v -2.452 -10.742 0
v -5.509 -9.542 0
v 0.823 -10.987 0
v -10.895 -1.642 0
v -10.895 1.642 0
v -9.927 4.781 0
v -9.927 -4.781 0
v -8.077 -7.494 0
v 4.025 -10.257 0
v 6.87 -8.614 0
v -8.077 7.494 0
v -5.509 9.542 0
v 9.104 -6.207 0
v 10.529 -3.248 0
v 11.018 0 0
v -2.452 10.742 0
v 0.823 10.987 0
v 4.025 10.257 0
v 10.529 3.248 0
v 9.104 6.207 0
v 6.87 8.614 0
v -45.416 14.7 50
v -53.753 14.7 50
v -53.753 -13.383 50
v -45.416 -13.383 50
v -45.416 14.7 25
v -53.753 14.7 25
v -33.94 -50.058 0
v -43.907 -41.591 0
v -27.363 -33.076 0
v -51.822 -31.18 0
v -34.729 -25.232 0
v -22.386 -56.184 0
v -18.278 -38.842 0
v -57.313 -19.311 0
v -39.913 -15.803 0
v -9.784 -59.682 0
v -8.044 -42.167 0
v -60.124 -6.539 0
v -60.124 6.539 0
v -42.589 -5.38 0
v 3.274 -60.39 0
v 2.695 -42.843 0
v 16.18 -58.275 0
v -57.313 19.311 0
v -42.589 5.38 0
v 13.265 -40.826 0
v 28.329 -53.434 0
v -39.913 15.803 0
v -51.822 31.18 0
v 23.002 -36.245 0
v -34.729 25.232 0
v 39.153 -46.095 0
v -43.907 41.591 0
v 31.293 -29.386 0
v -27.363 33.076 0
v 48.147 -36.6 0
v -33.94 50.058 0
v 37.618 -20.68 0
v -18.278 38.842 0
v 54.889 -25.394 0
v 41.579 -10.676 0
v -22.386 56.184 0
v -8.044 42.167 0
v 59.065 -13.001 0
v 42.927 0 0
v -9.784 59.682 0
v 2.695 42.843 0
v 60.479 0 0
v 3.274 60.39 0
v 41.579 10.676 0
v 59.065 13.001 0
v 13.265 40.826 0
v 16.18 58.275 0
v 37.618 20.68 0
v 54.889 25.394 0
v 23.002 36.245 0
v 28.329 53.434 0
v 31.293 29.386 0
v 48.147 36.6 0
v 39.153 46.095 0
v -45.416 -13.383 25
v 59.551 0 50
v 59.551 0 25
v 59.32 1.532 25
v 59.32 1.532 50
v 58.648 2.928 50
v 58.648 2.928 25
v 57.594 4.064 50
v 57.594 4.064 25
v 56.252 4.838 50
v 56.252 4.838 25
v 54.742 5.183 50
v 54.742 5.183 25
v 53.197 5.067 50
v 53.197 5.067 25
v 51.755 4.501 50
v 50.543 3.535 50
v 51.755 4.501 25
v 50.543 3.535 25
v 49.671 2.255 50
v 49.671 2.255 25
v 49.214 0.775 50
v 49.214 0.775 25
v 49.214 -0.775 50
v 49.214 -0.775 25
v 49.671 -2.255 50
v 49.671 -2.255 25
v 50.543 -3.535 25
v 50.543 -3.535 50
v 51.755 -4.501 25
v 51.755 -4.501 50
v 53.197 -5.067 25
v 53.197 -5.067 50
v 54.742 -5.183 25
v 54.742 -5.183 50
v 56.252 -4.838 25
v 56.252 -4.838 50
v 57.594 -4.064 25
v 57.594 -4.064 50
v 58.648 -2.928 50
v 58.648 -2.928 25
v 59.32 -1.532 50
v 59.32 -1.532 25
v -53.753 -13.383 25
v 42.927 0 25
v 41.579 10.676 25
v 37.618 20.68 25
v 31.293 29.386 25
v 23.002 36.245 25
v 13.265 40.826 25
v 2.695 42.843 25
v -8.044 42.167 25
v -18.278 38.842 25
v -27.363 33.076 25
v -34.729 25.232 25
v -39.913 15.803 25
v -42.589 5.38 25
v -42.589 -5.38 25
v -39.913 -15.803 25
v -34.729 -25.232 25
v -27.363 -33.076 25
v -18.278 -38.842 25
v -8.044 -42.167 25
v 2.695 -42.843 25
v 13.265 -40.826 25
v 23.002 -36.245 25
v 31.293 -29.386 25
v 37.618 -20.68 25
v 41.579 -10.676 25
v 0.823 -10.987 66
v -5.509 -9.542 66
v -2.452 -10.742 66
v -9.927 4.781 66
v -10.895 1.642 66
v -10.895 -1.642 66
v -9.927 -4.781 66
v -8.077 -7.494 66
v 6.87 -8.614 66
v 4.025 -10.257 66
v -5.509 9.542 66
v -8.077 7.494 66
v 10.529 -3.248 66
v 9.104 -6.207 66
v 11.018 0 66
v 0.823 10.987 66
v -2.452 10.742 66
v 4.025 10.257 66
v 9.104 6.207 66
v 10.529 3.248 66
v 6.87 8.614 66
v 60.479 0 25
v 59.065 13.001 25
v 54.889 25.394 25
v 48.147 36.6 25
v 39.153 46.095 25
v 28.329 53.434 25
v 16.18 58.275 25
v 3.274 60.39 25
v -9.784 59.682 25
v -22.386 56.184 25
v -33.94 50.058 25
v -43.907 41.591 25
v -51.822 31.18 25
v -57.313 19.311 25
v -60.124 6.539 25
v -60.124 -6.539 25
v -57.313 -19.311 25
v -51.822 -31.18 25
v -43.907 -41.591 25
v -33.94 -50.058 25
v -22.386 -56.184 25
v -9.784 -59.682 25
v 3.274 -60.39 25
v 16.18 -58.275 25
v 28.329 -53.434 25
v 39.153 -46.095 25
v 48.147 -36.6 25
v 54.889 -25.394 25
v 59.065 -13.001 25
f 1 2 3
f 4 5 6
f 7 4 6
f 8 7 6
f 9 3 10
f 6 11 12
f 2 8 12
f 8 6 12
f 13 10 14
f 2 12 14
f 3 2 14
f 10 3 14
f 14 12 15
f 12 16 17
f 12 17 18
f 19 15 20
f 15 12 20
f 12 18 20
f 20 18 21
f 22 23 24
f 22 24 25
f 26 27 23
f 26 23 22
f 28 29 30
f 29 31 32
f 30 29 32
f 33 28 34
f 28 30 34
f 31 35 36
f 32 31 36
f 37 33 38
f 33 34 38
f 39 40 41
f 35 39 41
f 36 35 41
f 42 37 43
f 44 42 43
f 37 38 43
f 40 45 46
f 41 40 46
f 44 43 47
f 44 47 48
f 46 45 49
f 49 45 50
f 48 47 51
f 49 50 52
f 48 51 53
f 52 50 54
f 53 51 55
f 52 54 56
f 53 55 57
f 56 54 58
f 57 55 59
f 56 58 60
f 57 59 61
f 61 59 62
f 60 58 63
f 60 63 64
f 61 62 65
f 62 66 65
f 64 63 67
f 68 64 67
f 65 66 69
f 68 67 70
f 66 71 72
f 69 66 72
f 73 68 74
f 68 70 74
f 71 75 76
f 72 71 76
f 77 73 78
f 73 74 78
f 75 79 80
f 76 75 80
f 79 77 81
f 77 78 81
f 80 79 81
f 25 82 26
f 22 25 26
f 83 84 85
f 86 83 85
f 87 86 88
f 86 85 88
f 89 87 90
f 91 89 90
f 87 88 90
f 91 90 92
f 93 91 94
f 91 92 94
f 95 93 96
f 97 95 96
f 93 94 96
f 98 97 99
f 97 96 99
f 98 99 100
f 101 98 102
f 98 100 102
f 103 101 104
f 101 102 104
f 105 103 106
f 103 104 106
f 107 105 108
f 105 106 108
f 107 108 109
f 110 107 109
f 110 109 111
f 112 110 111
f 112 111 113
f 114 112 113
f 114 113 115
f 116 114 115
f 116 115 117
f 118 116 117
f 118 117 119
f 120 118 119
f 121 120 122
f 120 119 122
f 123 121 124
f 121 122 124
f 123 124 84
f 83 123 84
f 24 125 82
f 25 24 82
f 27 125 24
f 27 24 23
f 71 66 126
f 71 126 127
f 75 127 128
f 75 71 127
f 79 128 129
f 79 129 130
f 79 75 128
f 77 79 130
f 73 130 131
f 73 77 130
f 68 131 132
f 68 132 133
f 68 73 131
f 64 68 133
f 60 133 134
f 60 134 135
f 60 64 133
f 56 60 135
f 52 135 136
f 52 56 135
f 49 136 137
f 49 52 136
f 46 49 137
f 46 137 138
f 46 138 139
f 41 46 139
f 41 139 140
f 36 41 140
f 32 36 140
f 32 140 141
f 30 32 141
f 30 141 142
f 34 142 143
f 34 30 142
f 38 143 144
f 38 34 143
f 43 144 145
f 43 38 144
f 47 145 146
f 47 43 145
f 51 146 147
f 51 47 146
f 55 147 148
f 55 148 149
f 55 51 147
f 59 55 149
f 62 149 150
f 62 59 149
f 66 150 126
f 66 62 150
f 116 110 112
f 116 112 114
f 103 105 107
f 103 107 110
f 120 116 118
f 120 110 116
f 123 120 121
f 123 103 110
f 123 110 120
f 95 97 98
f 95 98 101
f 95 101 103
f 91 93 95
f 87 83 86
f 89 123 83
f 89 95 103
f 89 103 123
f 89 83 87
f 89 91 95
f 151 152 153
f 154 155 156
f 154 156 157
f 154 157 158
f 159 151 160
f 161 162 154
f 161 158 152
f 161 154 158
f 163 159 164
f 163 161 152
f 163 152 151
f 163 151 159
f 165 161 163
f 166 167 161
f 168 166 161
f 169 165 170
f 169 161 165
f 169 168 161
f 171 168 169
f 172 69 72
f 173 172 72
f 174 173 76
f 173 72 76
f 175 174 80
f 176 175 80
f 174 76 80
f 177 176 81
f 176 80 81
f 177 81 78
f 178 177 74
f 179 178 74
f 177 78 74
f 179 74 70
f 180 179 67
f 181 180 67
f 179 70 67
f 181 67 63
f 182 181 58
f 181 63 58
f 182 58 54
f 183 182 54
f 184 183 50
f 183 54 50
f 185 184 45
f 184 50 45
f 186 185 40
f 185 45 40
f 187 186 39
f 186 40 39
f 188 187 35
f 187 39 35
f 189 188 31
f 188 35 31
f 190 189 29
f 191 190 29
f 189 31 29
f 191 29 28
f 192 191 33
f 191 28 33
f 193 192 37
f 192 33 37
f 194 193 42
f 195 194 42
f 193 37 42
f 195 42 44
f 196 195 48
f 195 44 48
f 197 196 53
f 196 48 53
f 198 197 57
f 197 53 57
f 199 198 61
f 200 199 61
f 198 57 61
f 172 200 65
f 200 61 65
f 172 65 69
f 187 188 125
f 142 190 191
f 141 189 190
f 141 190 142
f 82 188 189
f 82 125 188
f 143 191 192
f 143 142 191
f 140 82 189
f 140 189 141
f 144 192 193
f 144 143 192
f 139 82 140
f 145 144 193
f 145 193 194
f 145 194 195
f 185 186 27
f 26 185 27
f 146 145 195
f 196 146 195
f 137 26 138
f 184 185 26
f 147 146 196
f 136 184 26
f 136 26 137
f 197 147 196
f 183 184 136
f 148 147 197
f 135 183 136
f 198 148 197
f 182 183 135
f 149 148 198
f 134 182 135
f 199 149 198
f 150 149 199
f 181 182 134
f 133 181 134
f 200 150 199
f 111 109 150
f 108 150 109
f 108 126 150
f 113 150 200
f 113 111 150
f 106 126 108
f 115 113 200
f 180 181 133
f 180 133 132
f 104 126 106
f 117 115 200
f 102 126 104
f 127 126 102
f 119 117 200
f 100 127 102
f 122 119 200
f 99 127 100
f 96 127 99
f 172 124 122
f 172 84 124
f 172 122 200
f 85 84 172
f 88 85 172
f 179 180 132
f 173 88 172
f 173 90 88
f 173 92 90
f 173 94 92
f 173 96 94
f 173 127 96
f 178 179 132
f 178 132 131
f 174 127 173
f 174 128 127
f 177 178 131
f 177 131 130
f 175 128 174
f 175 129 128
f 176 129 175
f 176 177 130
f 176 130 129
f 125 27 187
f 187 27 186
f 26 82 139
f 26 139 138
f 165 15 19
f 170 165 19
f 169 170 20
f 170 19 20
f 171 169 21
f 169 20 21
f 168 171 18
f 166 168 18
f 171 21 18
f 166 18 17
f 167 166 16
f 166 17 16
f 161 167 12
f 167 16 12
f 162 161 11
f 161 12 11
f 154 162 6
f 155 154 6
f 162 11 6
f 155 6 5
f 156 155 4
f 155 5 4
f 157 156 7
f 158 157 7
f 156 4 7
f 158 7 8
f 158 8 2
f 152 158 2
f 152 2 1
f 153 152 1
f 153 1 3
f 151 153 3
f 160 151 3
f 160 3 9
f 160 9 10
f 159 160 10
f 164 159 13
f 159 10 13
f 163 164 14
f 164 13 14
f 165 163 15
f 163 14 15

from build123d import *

# Parameters (mm, degrees)
F0_R     = 11.018192
F1_DEPTH = 66
F0_R_2   = 60.479009
F0_R_3   = 42.927456
F2_DEPTH = 25
F3_W     = 8.337222
F3_H     = 28.083282
F4_DEPTH = 25
F5_R     = 5.197631
F6_DEPTH = 25


with BuildPart() as f1:
    # F0 (on Top) → F1 (new body)
    with BuildSketch(Plane.XY):
        Circle(F0_R)
    extrude(amount=F1_DEPTH)


with BuildPart() as f2:
    # F0 (on Top) → F2 (new body)
    with BuildSketch(Plane.XY):
        Circle(F0_R_2)
        Circle(F0_R_3, mode=Mode.SUBTRACT)
    extrude(amount=F2_DEPTH)

    # F3 (on face) → F4 (join)
    with BuildSketch(Plane.XY.offset(25)):
        with Locations((-49.584545, 0.658201)):
            Rectangle(F3_W, F3_H)
    extrude(amount=F4_DEPTH)

    # F5 (on face) → F6 (join)
    with BuildSketch(Plane.XY.offset(25)):
        with Locations((54.353569, 0)):
            Circle(F5_R)
    extrude(amount=F6_DEPTH)


solid = Compound([f1.part, f2.part])
